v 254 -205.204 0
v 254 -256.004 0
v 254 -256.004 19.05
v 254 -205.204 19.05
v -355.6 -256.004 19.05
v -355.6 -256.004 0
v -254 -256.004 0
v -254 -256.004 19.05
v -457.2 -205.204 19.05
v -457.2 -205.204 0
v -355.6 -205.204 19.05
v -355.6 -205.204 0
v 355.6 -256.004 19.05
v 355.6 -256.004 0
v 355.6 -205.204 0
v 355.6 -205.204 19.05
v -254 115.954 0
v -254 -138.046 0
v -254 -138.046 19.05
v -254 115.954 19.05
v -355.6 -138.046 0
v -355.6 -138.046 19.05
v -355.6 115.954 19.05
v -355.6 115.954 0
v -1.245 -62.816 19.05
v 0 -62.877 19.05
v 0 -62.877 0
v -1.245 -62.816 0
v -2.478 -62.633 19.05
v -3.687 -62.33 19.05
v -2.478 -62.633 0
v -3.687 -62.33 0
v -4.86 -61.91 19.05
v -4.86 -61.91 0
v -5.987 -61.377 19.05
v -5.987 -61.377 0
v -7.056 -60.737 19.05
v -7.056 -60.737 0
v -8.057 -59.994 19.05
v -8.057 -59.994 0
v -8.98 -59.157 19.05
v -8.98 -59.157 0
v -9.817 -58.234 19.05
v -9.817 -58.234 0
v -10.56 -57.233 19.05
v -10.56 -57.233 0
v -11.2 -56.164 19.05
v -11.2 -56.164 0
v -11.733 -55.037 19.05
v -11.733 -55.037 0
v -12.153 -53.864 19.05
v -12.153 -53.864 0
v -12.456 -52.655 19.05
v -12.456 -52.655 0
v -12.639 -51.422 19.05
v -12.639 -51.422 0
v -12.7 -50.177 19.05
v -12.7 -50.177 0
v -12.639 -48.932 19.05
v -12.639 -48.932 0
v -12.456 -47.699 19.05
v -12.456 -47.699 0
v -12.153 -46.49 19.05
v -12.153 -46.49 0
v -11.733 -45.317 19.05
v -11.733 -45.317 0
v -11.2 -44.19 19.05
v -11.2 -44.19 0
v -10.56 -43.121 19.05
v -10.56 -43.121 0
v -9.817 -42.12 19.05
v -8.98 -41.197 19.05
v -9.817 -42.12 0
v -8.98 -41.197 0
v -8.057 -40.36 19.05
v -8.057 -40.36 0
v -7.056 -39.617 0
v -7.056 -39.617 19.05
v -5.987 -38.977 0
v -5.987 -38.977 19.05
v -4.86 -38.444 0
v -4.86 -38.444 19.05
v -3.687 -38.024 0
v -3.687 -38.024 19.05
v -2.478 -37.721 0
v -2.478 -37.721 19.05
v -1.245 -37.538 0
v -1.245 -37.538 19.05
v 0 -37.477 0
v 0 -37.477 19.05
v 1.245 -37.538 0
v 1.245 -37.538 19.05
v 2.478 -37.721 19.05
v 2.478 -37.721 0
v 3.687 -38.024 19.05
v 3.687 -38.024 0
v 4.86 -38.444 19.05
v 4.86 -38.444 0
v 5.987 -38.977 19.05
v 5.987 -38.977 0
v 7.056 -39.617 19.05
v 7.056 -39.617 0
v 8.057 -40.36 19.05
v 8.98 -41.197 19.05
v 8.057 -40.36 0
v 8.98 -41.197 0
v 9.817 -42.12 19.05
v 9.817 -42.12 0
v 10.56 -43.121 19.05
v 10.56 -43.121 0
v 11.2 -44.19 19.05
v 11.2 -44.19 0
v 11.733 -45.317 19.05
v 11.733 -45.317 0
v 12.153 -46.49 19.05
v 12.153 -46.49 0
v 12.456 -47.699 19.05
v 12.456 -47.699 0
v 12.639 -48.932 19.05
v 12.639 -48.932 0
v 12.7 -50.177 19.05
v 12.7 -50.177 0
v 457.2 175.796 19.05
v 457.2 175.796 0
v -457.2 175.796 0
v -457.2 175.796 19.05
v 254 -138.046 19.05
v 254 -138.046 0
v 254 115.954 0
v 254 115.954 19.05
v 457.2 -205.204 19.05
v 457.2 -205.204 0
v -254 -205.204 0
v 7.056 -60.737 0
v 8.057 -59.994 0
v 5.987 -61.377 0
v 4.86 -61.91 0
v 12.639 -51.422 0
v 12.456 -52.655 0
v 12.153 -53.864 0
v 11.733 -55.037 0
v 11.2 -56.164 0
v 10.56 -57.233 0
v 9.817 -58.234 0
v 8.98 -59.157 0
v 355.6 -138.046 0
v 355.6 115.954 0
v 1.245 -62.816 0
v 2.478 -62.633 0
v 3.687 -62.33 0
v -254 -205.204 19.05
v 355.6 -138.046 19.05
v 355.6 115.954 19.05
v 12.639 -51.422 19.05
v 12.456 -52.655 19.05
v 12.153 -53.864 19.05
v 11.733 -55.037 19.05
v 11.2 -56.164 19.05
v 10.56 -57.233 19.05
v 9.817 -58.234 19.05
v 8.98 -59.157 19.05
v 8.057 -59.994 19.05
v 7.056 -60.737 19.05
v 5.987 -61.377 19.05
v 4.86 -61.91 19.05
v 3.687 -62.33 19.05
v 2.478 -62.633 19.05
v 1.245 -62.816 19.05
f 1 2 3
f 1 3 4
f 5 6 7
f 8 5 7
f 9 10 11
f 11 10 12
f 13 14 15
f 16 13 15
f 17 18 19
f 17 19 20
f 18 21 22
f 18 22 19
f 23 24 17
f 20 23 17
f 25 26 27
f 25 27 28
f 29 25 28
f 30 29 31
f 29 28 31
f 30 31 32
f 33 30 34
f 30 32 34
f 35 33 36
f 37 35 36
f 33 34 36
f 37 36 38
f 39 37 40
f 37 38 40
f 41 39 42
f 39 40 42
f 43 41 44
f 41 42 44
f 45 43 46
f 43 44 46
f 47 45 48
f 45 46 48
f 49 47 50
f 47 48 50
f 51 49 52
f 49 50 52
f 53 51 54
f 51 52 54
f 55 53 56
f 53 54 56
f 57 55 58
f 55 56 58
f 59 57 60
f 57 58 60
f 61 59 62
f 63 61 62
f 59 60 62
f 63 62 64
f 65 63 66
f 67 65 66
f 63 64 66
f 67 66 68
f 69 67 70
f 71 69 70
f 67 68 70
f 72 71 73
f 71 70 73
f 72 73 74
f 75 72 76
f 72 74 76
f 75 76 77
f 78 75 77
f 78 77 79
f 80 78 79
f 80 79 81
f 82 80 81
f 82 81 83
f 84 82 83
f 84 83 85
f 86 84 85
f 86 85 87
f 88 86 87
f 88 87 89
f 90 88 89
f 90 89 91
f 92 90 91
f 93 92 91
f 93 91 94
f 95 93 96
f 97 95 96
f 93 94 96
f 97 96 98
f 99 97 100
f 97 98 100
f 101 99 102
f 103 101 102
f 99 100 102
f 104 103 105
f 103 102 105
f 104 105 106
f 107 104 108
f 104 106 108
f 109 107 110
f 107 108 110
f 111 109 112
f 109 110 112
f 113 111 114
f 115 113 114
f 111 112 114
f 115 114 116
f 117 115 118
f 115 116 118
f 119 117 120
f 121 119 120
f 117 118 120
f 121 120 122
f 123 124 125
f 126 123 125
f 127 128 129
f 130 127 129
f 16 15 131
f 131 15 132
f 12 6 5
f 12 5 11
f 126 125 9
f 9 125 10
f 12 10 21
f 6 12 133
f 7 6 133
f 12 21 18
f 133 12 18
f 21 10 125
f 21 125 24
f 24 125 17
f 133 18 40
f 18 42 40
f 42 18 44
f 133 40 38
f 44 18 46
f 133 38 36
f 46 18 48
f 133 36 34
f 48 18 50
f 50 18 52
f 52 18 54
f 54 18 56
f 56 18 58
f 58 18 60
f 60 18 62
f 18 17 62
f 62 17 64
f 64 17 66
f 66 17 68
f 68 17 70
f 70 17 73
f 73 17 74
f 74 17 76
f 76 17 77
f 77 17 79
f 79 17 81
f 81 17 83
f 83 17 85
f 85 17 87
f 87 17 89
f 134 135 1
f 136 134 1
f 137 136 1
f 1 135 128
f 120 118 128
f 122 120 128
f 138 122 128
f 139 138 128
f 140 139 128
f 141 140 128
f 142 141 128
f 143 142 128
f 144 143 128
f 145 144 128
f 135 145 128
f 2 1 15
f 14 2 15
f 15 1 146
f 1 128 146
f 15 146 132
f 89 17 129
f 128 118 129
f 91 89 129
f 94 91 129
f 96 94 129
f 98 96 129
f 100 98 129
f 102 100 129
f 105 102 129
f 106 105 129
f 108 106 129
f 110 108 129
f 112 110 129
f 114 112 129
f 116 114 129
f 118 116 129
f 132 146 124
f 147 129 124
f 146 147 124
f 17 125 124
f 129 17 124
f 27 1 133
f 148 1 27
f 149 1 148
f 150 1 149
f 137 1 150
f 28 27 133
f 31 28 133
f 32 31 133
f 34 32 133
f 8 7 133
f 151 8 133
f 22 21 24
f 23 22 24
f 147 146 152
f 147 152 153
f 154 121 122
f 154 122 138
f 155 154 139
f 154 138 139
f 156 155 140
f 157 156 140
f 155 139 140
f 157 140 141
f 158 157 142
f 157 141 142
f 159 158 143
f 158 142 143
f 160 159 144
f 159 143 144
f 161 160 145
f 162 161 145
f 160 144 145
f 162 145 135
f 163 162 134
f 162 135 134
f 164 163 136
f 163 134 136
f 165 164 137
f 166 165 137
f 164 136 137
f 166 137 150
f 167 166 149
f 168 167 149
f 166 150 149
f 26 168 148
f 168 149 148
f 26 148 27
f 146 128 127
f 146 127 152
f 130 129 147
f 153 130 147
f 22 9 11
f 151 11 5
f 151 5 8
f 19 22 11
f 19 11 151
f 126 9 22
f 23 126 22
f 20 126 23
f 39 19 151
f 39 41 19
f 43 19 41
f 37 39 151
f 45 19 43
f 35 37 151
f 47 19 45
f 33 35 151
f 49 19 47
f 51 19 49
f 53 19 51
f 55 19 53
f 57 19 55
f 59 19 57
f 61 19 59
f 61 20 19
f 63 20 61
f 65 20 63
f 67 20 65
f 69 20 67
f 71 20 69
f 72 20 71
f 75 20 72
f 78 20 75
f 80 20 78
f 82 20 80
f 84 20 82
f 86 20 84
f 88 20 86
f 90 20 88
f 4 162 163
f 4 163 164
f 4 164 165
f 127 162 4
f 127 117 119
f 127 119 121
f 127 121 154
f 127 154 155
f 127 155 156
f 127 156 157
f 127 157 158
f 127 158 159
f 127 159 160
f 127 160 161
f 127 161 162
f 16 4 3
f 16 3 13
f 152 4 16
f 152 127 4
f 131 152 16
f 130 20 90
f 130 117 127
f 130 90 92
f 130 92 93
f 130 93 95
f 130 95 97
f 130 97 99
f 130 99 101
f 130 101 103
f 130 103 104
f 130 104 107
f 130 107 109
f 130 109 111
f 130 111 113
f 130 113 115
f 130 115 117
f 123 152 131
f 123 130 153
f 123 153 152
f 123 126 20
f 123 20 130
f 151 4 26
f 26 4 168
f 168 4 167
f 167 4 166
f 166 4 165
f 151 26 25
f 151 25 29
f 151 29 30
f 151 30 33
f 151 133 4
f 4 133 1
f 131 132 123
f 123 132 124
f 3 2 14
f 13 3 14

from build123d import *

# Parameters (mm, degrees)
F0_W     = 101.6
F0_H     = 254
F0_H_2   = 50.8
F1_DEPTH = 19.05


with BuildPart() as f1:
    # F0 (on Top) → F1 (new body)
    with BuildSketch(Plane.XY):
        with BuildLine():
            ThreePointArc((12.70004, -50.177005), (-8.980216, -41.196749), (4e-05, -62.877005))
            ThreePointArc((4e-05, -62.877005), (8.980296, -59.157261), (12.70004, -50.177005))
        make_face()
        Polygon((457.2, 175.795518), (-457.2, 175.795518), (-457.2, -205.204482), (-355.6, -205.204482), (-254, -205.204482), (4e-05, -205.204482), (254, -205.204482), (355.6, -205.204482), (457.2, -205.204482), align=None)
        with BuildLine():
            ThreePointArc((12.70004, -50.177005), (8.980296, -59.157261), (4e-05, -62.877005))
            ThreePointArc((4e-05, -62.877005), (-8.980216, -41.196749), (12.70004, -50.177005))
        make_face(mode=Mode.SUBTRACT)
        with Locations((-304.8, -11.045669)):
            Rectangle(F0_W, F0_H, mode=Mode.SUBTRACT)
        with Locations((304.8, -11.045669)):
            Rectangle(F0_W, F0_H, mode=Mode.SUBTRACT)
        with Locations((-304.8, -230.604482)):
            Rectangle(F0_W, F0_H_2)
        with Locations((304.8, -230.604482)):
            Rectangle(F0_W, F0_H_2)
    extrude(amount=F1_DEPTH)


solid = f1.part
